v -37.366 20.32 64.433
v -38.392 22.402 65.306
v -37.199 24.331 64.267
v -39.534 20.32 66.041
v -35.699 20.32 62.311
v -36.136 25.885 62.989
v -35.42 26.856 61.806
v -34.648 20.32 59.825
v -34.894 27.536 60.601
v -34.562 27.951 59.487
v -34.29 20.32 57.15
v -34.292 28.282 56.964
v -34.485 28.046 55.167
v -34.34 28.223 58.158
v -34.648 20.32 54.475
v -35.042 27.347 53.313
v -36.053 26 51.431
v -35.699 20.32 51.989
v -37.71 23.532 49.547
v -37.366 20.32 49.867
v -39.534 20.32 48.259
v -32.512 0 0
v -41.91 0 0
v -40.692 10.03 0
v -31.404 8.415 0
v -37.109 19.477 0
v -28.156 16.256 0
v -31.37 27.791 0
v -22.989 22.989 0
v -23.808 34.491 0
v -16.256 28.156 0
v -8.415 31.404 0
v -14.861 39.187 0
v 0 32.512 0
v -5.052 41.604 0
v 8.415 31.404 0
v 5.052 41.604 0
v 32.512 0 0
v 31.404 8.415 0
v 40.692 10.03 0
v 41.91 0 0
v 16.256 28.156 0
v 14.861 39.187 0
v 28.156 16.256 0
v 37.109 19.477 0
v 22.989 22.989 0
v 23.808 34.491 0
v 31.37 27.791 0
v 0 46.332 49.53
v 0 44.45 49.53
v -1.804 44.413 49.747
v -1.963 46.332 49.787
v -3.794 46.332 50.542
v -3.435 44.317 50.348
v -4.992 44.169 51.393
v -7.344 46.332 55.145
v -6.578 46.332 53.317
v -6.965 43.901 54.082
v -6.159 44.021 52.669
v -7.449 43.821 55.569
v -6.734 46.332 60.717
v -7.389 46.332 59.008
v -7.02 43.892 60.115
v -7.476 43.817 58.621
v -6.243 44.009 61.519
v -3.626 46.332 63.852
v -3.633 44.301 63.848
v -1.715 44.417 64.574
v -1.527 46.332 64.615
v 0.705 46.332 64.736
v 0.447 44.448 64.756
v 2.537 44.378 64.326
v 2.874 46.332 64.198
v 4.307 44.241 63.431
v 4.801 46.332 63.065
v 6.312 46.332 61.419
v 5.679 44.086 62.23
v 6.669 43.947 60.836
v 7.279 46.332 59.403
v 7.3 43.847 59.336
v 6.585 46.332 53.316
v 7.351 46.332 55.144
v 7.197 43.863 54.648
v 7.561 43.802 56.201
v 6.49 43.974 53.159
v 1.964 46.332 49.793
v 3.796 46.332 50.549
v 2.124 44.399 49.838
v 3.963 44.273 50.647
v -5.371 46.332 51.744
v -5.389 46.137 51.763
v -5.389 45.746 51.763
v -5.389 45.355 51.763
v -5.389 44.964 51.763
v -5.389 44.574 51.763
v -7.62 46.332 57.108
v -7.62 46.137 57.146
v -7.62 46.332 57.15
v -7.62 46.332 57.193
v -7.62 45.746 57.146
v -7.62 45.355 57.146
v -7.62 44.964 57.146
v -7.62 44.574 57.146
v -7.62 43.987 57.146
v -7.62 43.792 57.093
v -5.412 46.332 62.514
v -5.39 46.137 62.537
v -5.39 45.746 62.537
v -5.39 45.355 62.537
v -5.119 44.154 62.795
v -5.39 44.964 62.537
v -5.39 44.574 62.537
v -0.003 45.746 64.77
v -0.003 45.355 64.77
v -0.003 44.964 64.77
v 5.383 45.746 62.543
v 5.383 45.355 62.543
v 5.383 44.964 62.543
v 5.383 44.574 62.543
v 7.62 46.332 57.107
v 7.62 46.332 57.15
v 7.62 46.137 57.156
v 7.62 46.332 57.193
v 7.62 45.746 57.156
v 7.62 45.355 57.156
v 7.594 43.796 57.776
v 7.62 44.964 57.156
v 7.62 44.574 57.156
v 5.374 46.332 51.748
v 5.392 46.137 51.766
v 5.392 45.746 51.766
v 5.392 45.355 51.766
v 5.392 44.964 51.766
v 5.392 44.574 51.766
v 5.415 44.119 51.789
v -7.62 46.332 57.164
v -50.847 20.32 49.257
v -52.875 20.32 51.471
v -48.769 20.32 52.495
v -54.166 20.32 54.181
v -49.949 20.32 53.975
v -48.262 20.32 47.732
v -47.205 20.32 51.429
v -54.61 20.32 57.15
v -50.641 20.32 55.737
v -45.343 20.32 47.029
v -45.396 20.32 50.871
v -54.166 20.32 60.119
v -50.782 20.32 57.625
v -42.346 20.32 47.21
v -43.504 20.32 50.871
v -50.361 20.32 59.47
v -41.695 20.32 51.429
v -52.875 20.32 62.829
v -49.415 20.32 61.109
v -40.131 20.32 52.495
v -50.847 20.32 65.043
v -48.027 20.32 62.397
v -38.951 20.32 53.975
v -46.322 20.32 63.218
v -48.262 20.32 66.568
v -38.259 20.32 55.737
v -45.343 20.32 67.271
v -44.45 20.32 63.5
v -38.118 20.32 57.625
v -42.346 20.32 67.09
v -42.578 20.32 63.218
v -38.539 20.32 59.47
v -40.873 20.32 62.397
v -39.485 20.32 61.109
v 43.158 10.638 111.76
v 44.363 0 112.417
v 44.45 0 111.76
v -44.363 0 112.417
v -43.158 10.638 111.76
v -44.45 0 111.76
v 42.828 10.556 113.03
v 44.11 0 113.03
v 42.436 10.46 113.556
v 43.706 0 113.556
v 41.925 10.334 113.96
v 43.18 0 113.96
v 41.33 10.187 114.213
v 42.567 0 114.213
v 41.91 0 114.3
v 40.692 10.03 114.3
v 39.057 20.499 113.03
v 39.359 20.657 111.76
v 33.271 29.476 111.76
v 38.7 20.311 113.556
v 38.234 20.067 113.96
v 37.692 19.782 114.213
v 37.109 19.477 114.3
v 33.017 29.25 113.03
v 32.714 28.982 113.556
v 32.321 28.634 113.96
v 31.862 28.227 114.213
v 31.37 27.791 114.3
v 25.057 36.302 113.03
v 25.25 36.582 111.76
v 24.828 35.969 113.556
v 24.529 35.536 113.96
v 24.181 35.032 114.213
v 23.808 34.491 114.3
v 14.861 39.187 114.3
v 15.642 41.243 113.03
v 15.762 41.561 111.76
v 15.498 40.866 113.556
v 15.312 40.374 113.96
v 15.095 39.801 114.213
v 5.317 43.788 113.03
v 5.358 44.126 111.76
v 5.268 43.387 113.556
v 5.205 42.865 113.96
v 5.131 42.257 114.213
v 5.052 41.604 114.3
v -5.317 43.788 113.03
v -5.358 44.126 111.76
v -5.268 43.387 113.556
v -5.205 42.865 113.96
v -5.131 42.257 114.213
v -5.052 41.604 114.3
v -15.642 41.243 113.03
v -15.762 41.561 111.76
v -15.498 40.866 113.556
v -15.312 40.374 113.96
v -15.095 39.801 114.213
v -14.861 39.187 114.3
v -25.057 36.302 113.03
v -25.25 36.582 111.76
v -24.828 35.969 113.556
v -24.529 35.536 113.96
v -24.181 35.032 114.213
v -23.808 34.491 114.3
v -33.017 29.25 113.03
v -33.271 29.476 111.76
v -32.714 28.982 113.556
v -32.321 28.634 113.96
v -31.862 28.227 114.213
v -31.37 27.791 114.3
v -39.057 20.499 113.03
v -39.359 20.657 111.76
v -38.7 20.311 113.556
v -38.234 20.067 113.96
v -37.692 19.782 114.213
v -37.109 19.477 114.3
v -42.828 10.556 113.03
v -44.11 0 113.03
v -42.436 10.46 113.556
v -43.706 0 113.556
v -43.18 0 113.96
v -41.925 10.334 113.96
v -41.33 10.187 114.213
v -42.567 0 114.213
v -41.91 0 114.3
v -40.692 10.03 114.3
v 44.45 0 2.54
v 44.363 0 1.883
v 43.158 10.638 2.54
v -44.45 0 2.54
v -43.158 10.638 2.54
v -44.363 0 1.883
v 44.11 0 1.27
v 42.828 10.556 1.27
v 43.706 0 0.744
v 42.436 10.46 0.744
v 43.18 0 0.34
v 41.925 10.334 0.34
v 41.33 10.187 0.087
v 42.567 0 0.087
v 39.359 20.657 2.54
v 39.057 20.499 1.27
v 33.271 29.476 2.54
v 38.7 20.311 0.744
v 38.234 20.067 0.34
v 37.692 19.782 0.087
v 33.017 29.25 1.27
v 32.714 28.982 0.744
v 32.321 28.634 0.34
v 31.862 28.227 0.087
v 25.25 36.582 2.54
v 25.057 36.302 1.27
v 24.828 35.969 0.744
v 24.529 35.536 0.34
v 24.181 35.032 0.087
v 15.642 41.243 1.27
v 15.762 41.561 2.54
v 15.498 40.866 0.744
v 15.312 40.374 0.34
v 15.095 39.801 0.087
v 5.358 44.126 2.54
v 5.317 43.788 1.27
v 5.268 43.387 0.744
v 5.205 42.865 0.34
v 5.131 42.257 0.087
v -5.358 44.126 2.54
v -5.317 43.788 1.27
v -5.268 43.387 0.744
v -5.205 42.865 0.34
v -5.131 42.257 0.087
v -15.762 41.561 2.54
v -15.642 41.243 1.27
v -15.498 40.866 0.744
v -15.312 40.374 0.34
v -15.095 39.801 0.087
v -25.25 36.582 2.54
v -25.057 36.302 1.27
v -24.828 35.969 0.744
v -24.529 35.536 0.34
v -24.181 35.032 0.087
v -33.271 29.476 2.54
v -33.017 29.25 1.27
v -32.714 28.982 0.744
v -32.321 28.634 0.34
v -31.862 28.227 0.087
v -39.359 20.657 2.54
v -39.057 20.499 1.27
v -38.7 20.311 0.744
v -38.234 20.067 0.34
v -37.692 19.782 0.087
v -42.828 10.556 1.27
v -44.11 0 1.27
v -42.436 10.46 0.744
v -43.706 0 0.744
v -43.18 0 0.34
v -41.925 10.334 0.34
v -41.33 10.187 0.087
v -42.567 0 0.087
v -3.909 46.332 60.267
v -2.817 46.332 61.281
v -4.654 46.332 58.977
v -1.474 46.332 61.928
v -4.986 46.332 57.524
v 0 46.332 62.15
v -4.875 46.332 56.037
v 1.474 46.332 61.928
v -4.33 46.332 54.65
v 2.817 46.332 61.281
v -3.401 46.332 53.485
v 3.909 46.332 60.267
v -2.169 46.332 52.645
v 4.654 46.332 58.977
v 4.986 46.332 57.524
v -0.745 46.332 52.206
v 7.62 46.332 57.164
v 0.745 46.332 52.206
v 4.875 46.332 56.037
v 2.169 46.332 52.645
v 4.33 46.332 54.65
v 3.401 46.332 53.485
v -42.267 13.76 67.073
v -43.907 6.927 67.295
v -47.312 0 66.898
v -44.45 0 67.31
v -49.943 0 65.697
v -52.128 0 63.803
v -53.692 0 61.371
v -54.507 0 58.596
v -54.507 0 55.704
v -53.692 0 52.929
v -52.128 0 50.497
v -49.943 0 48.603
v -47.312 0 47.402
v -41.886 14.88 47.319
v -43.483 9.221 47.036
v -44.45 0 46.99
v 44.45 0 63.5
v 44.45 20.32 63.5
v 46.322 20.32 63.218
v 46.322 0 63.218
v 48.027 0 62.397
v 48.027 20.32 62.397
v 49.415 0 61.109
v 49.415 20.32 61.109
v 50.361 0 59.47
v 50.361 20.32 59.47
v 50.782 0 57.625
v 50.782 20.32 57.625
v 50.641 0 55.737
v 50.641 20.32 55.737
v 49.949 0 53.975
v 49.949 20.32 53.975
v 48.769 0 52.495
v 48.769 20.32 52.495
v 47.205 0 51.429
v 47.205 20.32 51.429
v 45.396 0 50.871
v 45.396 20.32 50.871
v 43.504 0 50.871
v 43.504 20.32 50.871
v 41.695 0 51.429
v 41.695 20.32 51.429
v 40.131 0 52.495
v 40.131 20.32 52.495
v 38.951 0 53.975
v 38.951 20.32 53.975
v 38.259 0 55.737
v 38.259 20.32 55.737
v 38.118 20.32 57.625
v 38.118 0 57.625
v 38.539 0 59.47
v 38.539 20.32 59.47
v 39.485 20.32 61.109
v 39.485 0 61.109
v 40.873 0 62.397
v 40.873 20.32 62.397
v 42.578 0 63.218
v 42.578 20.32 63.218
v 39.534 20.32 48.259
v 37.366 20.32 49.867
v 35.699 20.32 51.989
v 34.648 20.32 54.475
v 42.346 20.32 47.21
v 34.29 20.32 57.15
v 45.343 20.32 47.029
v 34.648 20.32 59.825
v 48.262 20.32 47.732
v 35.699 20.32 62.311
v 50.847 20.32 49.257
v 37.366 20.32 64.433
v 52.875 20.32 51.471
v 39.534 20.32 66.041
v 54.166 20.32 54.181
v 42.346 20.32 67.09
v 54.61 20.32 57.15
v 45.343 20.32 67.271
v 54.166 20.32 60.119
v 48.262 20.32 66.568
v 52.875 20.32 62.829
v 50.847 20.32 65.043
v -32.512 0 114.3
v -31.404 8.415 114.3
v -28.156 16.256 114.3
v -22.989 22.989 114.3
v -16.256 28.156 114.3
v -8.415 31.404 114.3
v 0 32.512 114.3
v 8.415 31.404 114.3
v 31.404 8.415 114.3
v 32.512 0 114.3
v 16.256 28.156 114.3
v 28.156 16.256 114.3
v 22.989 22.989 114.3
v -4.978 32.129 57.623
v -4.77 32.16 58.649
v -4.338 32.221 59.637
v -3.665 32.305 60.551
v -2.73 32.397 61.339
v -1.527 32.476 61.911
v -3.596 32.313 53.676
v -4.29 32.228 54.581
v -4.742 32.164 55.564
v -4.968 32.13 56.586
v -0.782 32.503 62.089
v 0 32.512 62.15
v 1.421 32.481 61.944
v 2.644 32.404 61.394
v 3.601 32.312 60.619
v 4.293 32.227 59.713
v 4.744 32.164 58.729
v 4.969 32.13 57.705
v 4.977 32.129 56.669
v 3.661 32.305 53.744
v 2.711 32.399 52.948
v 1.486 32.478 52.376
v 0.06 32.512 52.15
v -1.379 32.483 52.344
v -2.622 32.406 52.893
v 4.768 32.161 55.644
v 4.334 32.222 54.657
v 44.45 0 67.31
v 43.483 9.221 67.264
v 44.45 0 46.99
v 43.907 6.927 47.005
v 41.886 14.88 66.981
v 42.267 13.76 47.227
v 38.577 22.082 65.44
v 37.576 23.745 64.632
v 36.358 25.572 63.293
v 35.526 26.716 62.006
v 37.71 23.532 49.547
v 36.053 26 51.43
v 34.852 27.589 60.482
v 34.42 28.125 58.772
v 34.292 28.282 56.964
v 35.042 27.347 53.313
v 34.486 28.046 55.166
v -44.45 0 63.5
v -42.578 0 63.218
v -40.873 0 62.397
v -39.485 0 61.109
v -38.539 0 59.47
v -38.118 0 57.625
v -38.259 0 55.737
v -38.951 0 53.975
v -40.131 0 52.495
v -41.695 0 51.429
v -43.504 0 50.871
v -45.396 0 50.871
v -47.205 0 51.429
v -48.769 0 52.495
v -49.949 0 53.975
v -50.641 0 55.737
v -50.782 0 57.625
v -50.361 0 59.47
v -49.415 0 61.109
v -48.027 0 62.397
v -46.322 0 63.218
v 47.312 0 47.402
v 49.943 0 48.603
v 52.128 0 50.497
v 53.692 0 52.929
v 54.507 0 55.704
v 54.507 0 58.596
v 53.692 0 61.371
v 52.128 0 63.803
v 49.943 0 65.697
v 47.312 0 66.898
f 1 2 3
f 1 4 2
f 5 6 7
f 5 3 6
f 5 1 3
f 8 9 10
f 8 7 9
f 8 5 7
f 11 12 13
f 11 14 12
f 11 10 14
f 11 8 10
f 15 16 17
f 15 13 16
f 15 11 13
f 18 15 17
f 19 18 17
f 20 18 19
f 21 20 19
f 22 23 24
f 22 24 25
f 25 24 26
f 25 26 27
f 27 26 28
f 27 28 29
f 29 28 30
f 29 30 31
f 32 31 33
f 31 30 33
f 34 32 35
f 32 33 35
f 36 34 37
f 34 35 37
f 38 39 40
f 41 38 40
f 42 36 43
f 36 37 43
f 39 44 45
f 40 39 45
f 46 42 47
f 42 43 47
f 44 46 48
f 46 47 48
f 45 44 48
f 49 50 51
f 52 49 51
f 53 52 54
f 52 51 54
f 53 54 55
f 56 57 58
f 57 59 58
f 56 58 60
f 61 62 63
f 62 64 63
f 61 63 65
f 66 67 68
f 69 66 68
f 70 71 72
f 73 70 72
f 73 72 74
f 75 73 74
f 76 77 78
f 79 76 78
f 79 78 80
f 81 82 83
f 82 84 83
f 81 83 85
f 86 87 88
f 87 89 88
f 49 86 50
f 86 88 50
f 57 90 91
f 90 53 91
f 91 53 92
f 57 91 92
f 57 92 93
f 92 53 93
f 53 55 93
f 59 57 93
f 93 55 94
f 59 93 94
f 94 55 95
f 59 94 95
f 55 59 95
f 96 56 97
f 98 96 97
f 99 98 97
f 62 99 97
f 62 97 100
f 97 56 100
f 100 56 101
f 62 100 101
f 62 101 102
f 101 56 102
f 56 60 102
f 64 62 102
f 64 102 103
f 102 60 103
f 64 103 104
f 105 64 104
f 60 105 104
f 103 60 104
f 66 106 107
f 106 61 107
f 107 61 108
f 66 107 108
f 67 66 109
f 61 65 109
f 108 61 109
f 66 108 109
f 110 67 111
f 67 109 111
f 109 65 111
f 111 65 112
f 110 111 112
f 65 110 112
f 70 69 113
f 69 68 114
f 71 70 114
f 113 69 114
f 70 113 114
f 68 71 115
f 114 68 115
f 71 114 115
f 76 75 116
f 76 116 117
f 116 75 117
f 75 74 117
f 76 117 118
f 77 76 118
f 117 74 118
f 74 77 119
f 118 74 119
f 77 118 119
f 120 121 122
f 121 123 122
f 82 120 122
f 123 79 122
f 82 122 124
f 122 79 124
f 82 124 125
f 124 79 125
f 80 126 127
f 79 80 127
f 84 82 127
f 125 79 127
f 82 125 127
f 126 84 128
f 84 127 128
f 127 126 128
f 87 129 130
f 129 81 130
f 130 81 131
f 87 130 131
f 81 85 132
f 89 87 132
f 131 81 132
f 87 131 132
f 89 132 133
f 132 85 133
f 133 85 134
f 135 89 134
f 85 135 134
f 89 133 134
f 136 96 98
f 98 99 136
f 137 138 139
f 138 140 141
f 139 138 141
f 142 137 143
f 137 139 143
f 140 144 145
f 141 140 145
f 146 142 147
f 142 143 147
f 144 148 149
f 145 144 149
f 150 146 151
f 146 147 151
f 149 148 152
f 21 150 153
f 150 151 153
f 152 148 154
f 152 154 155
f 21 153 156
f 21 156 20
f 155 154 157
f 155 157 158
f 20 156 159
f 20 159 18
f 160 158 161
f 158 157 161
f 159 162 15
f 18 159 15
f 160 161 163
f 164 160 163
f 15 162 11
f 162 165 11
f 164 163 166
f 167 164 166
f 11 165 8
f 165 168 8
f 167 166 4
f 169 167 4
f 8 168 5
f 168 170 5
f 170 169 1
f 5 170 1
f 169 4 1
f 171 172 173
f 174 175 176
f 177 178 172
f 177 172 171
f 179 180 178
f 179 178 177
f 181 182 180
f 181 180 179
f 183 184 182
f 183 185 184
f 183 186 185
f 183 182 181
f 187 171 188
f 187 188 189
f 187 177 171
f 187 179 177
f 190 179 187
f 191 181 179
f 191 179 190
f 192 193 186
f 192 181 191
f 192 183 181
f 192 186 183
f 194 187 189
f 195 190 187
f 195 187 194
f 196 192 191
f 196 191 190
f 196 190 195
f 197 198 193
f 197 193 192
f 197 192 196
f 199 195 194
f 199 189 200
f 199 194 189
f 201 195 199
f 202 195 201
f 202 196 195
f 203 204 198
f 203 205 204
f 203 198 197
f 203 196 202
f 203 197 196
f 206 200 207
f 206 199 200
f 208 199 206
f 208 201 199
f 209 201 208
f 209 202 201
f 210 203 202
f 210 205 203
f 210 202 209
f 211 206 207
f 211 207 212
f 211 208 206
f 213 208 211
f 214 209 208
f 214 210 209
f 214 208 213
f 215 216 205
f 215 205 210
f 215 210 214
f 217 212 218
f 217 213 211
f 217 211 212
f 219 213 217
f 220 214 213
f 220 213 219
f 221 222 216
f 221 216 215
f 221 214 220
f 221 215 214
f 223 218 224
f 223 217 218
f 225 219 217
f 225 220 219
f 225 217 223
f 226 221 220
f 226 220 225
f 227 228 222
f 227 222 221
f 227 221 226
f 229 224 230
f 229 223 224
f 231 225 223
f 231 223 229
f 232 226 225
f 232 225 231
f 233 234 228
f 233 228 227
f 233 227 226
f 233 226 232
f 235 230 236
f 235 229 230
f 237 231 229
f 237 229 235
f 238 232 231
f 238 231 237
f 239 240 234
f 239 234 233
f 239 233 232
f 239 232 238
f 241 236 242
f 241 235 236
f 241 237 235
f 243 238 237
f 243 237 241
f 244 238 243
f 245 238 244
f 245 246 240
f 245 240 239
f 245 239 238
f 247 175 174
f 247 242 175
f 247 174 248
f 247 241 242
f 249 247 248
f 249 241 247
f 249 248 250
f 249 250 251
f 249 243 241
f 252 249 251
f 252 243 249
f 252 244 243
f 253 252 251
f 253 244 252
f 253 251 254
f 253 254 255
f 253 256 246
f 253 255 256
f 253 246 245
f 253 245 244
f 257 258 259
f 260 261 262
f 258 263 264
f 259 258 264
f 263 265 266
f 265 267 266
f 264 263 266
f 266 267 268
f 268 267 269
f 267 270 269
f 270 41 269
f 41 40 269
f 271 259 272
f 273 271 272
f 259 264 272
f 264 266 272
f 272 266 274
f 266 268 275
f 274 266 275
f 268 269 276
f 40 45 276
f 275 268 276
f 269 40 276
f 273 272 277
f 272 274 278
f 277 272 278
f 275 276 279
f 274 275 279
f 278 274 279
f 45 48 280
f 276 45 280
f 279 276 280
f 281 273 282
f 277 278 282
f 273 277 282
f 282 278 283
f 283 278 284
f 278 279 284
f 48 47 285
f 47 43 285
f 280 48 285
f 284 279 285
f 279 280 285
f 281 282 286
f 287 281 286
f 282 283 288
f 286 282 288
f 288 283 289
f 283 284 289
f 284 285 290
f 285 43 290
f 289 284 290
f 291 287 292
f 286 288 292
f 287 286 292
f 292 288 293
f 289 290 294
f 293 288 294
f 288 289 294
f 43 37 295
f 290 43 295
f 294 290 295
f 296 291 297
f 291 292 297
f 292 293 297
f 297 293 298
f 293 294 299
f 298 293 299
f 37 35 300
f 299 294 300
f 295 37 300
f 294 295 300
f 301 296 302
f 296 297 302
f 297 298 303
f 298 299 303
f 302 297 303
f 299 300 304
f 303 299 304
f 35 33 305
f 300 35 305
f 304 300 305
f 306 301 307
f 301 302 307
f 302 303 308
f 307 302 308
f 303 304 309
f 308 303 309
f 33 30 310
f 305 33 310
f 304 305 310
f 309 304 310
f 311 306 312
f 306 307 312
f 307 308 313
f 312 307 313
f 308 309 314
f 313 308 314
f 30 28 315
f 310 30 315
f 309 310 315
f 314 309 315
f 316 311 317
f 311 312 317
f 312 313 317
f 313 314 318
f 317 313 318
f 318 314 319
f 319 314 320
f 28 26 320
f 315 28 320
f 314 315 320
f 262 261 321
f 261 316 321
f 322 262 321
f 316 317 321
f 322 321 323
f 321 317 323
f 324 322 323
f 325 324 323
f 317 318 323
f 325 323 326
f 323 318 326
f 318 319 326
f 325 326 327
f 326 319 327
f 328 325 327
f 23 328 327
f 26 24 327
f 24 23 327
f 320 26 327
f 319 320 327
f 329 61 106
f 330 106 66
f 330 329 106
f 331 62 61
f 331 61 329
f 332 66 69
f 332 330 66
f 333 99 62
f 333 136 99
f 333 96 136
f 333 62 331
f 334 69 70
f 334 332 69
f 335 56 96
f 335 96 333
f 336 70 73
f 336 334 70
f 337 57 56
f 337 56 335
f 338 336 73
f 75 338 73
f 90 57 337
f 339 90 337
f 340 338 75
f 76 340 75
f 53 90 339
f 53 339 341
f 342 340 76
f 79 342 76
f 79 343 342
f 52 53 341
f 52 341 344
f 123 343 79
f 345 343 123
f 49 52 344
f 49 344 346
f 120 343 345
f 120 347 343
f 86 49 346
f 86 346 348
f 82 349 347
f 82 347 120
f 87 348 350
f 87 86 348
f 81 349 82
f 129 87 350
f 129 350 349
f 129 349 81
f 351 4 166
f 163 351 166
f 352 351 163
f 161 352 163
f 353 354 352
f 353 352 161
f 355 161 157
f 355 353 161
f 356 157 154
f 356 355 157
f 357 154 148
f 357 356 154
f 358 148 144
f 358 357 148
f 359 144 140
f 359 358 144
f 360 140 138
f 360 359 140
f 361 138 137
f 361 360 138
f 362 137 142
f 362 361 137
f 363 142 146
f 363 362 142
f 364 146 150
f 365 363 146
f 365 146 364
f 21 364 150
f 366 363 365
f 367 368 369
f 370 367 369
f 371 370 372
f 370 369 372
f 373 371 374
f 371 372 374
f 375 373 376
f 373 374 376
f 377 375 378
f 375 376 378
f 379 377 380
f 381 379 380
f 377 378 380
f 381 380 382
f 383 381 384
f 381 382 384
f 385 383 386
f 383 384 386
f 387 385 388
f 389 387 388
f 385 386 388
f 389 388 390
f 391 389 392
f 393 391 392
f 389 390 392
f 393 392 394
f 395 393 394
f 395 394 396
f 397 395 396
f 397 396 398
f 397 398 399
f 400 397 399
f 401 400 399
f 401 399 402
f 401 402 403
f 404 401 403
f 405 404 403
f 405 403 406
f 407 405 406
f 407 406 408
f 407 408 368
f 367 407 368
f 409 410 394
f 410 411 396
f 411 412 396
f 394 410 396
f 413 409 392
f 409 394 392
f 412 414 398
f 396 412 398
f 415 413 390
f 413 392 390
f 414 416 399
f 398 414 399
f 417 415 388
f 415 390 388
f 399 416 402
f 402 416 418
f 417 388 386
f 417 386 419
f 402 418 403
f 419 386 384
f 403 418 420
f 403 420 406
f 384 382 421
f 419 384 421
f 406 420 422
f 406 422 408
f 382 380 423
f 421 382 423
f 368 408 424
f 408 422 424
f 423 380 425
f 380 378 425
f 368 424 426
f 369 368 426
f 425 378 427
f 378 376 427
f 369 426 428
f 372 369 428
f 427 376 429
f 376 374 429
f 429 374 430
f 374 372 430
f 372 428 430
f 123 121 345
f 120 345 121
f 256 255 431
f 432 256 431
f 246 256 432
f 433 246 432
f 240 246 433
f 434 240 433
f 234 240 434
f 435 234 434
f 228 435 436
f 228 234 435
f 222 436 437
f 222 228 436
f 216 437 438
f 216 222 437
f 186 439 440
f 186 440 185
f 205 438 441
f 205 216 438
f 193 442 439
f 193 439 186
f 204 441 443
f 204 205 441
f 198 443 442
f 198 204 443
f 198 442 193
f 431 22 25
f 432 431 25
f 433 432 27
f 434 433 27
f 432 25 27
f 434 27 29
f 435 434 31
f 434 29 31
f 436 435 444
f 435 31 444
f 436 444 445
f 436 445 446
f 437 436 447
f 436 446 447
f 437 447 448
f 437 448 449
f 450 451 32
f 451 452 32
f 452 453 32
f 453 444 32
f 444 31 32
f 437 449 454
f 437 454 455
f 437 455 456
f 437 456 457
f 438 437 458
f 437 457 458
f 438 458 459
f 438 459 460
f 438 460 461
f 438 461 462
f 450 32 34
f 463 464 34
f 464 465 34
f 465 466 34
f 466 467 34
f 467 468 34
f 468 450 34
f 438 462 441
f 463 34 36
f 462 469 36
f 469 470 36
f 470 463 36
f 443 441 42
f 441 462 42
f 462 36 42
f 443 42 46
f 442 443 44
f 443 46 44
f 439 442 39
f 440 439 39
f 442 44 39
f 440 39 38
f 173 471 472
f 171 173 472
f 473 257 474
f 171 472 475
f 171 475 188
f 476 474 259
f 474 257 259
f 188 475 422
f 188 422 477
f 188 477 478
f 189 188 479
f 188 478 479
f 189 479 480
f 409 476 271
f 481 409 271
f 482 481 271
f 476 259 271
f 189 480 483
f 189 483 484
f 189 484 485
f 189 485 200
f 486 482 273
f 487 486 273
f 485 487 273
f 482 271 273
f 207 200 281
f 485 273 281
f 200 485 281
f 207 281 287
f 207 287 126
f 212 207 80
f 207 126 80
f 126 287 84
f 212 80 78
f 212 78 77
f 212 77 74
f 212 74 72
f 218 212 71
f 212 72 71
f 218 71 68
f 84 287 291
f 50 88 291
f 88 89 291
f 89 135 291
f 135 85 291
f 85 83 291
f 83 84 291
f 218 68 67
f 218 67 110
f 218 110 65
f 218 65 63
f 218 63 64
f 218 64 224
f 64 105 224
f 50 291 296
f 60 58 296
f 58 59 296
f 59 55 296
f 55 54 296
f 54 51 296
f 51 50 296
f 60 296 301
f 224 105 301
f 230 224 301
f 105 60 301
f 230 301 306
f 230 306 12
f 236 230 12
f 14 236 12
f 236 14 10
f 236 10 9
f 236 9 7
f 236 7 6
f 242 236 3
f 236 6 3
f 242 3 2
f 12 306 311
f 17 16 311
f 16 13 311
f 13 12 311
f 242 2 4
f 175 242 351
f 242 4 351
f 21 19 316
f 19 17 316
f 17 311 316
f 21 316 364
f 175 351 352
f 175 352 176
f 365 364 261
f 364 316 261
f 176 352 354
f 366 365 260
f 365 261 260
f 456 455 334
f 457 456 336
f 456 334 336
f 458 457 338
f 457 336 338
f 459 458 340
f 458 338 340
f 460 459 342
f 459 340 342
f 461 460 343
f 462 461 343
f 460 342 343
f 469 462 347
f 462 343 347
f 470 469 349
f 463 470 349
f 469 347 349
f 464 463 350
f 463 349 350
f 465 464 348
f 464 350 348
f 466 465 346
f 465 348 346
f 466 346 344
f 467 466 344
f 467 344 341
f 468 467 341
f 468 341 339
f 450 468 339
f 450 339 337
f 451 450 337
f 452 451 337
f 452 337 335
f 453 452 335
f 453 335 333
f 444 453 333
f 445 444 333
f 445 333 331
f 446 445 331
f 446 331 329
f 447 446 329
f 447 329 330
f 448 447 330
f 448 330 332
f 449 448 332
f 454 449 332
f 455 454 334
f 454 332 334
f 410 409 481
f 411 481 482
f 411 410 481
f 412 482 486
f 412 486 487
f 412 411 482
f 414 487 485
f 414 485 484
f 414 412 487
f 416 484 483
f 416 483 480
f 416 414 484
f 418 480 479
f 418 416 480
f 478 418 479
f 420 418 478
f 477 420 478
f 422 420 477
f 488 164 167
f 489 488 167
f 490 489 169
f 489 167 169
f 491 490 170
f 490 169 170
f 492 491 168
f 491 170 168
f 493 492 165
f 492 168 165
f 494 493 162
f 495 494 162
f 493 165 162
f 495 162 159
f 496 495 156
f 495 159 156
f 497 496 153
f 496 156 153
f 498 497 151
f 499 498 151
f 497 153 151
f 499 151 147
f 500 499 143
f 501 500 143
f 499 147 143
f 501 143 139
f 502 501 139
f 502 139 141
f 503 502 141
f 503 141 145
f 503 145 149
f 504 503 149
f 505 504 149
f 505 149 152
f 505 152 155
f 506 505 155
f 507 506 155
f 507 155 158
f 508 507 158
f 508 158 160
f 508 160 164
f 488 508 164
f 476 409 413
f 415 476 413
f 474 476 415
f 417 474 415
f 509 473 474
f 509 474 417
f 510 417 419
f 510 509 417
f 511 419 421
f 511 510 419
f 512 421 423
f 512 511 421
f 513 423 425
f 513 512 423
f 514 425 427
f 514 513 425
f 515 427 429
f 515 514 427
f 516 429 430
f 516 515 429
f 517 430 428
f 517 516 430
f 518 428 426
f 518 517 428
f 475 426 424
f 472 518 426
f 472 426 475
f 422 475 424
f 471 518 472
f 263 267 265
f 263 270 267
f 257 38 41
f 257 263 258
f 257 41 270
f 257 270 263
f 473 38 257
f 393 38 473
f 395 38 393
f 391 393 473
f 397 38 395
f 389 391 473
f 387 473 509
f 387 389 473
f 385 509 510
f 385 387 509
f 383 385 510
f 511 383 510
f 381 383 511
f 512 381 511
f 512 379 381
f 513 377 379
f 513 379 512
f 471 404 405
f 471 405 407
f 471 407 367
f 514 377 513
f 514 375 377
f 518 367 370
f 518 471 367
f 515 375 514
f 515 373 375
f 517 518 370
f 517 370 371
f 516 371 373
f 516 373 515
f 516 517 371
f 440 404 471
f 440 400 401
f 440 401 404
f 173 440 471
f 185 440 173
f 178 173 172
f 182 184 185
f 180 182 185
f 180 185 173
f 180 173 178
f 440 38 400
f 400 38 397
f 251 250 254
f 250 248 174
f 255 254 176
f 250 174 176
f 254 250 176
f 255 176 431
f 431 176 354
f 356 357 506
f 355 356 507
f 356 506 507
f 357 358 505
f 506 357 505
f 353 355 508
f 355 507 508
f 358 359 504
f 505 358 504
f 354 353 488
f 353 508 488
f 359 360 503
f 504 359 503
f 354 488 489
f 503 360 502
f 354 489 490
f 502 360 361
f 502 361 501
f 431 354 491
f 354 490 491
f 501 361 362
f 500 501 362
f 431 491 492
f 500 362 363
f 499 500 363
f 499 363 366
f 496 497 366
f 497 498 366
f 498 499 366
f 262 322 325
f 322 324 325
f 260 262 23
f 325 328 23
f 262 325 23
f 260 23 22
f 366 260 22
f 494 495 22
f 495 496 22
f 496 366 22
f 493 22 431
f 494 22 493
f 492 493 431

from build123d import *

# Parameters (mm, degrees)
BOSS_EXTRUDE1_DEPTH     = 114.3
SKETCH3_R               = 10.16
BOSS_EXTRUDE2_DEPTH     = 20.32
SKETCH5_R               = 10.16
CUT_EXTRUDE1_DEPTH      = 12.7
FILLET2_R               = 2.54
SKETCH6_R               = 6.35
CUT_EXTRUDE2_DEPTH      = 129.953476168
BOSS_EXTRUDE3_START     = 43.791955851
BOSS_EXTRUDE3_DEPTH     = 3.198044249
BOSS_EXTRUDE3_START_2   = 49
BOSS_EXTRUDE3_2_DEPTH   = 17
CUT_EXTRUDE3_DEPTH      = 136.11033375
CUT_EXTRUDE3_DEPTH_BACK = 136.11033375
SKETCH8_W               = 15.239999981
SKETCH8_H               = 4.021184516
CUT_EXTRUDE4_DEPTH      = 135.882901337
CUT_EXTRUDE4_DEPTH_BACK = 135.882901337
SKETCH10_R              = 3.175
SKETCH11_R              = 5
CUT_EXTRUDE5_DEPTH      = 30


with BuildPart() as part:
    # Sketch2 → Boss-Extrude1 (new body)
    with BuildSketch(Plane.XY):
        with BuildLine():
            Line((-44.45, 0), (-32.512, 0))
            ThreePointArc((-32.512, 0), (0, 32.512), (32.512, 0))
            Line((32.512, 0), (44.45, 0))
            ThreePointArc((44.45, 0), (0, 44.45), (-44.45, 0))
        make_face()
    extrude(amount=BOSS_EXTRUDE1_DEPTH)

    # Sketch3 → Boss-Extrude2 (add)
    with BuildSketch(Plane.XZ):
        with Locations((44.45, 57.15)):
            Circle(SKETCH3_R)
        with Locations((-44.45, 57.15)):
            Circle(SKETCH3_R)
    extrude(amount=-BOSS_EXTRUDE2_DEPTH)

    # Sketch5 → Cut-Extrude1 (cut)
    with BuildSketch(Plane(origin=(0, 20.32, 0), x_dir=(1, 0, 0), z_dir=(0, 1, 0))):
        with Locations((44.45, -57.15)):
            Circle(SKETCH5_R)
        with Locations((-44.45, -57.15)):
            Circle(SKETCH5_R)
    extrude(amount=CUT_EXTRUDE1_DEPTH, mode=Mode.SUBTRACT)

    # Fillet2
    fillet2_edges = [part.edges().sort_by_distance(p)[0] for p in [
        (0, 44.45, 114.3),
        (0, 44.45, 0),
    ]]
    fillet(fillet2_edges, radius=FILLET2_R)

    # Sketch6 → Cut-Extrude2 (cut, through all)
    with BuildSketch(Plane(origin=(0, 20.32, 0), x_dir=(1, 0, 0), z_dir=(0, 1, 0))):
        with Locations(Location((44.45, -57.15, 0), (0, 0, 270))):
            Circle(SKETCH6_R)
        with Locations(Location((-44.45, -57.15, 0), (0, 0, 270))):
            Circle(SKETCH6_R)
    extrude(amount=-CUT_EXTRUDE2_DEPTH, mode=Mode.SUBTRACT)

    # Boss-Extrude3: read off the stored shape, not the designer's step
    # Boss-Extrude3 outline → Boss-Extrude3 (add)
    with BuildSketch(Plane(origin=(0, 0, 0), x_dir=(1, 0, 0), z_dir=(0, 1, 0)).offset(BOSS_EXTRUDE3_START)):
        with BuildLine():
            add(Edge.make_bspline(
                [(0, -49.53), (-1.008821651, -49.53), (-1.998619935, -49.72927394), (-3.843308667, -50.494879009), (-4.687454894, -51.060962916), (-6.791679377, -53.165741576), (-7.618847434, -55.15374527), (-7.620574374, -58.141520807), (-7.42290115, -59.141073642), (-6.658087545, -60.988450986), (-6.098856032, -61.827039285), (-4.680577167, -63.2461413), (-3.842032005, -63.805727128), (-1.998902378, -64.570532515), (-0.998499986, -64.769608068), (1.988013472, -64.770782097), (3.977148932, -63.946590903), (6.086279789, -61.841304586), (6.651483441, -61.000012912), (7.419760337, -59.152994739), (7.619200893, -58.162953427), (7.620794336, -56.149105114), (7.421964798, -55.156604804), (6.658890114, -53.313547431), (6.092840739, -52.467609132), (3.99113944, -50.362690075), (2.017643301, -49.53), (0, -49.53)],
                knots=[0, 0, 0, 0, 0.0625, 0.0625, 0.125, 0.125, 0.25, 0.25, 0.3125, 0.3125, 0.375, 0.375, 0.4375, 0.4375, 0.5, 0.5, 0.625, 0.625, 0.6875, 0.6875, 0.75, 0.75, 0.8125, 0.8125, 0.875, 0.875, 1, 1, 1, 1], degree=3))
        make_face()
    extrude(amount=BOSS_EXTRUDE3_DEPTH)

    # Boss-Extrude3 2 outline → Boss-Extrude3 2 (cut)
    with BuildSketch(Plane.XY.offset(BOSS_EXTRUDE3_START_2)):
        with BuildLine():
            Line((-9, 46.09176164), (-7.623050959, 46.33145572))
            ThreePointArc((-7.623050959, 46.33145572), (-3.825721713, 46.825057902), (0, 46.99))
            Line((0, 46.99), (-9, 46.9900001))
            Line((-9, 46.9900001), (-9, 46.09176164))
        make_face()
        with BuildLine():
            Line((9, 46.9900001), (0, 46.99))
            ThreePointArc((0, 46.99), (3.825781455, 46.825052741), (7.623169112, 46.331435152))
            Line((7.623169112, 46.331435152), (9, 46.091757812))
            Line((9, 46.091757812), (9, 46.9900001))
        make_face()
    extrude(amount=BOSS_EXTRUDE3_2_DEPTH, mode=Mode.SUBTRACT)

    # Sketch8 → Cut-Extrude3 (cut, two sides: drawn at the far end of the back side and taken through both)
    with BuildSketch(Plane.XY.offset(114.3).offset(-CUT_EXTRUDE3_DEPTH_BACK)):
        with Locations((9e-09, 48.342600124)):
            Rectangle(SKETCH8_W, SKETCH8_H)
    extrude(amount=CUT_EXTRUDE3_DEPTH + CUT_EXTRUDE3_DEPTH_BACK, mode=Mode.SUBTRACT)

    # Sketch10 → Cut-Extrude4 (cut, two sides: drawn at the far end of the back side and taken through both)
    with BuildSketch(Plane(origin=(0, 46.332007866, 0), x_dir=(1, 0, 0), z_dir=(0, 1, 0)).offset(-CUT_EXTRUDE4_DEPTH_BACK)):
        with Locations(Location((0, -57.15, 0), (0, 0, 270))):
            Circle(SKETCH10_R)
    extrude(amount=CUT_EXTRUDE4_DEPTH + CUT_EXTRUDE4_DEPTH_BACK, mode=Mode.SUBTRACT)

    # Sketch11 → Cut-Extrude5 (cut)
    with BuildSketch(Plane(origin=(0, 46.332007866, 0), x_dir=(1, 0, 0), z_dir=(0, 1, 0))):
        with Locations(Location((0, -57.15, 0), (0, 0, 270))):
            Circle(SKETCH11_R)
    extrude(amount=-CUT_EXTRUDE5_DEPTH, mode=Mode.SUBTRACT)


solid = part.part
